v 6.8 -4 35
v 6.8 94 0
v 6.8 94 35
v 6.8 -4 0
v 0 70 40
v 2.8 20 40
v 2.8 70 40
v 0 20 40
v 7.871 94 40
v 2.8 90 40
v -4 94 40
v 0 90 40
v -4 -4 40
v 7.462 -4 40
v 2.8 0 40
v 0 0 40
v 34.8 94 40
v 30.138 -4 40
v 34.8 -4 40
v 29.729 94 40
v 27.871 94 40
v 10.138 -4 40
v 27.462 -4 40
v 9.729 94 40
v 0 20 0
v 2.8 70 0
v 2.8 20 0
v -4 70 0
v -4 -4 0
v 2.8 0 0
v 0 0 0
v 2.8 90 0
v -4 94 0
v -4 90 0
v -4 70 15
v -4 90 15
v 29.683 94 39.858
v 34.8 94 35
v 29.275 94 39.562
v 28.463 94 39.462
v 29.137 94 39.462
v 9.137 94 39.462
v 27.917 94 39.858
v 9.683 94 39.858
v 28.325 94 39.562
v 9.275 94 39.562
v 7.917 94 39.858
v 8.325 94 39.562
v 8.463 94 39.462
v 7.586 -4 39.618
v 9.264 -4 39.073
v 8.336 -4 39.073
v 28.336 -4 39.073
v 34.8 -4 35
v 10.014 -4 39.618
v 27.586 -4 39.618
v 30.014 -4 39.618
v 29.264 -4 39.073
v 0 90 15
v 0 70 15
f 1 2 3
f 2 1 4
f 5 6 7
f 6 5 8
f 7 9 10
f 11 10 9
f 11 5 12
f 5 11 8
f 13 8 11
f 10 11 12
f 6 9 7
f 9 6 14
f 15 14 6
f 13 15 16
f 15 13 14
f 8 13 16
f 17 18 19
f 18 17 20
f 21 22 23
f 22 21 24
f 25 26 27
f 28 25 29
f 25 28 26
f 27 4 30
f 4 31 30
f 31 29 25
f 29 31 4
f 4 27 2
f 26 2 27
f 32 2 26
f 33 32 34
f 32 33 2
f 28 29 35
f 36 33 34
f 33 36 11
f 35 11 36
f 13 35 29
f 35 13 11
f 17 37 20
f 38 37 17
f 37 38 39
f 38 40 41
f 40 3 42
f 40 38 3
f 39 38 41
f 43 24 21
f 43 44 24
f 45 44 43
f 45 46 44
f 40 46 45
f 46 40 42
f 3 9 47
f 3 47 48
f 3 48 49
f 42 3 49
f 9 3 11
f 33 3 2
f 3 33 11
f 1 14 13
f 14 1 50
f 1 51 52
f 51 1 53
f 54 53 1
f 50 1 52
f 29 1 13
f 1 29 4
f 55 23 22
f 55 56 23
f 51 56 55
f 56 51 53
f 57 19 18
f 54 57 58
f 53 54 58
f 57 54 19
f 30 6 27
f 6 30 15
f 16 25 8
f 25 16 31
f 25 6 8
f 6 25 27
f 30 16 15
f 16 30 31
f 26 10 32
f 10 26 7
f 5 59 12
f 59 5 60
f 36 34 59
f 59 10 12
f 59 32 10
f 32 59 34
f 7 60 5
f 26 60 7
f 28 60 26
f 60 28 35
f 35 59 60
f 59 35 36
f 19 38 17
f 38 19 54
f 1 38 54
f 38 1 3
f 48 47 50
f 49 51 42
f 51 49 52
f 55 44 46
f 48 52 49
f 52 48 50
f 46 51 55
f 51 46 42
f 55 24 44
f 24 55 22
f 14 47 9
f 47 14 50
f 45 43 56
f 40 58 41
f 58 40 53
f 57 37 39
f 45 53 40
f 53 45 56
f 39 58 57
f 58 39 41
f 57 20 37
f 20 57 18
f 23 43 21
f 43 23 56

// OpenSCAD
$fn=10;

difference(){
translate([-4,-4,0])
cube([4+2.8+4, 98, 40]);

cube([2.8, 20, 40]);

translate([0,70,0])cube([2.8, 20, 40]);
translate([-4,70,0])cube([2.8+4, 20, 40-25]);
    
}

difference() {
translate([2.8+4,-4,40-5])
cube([28, 98, 5]);
    
#
translate([2.8+4+2,-4,40+0.5])
rotate([-90,0,0])
cylinder(120, 1.5);    
    
translate([2.8+4+2+20,-4,40+0.5])
rotate([-90,0,0])
cylinder(120, 1.5);    
}
